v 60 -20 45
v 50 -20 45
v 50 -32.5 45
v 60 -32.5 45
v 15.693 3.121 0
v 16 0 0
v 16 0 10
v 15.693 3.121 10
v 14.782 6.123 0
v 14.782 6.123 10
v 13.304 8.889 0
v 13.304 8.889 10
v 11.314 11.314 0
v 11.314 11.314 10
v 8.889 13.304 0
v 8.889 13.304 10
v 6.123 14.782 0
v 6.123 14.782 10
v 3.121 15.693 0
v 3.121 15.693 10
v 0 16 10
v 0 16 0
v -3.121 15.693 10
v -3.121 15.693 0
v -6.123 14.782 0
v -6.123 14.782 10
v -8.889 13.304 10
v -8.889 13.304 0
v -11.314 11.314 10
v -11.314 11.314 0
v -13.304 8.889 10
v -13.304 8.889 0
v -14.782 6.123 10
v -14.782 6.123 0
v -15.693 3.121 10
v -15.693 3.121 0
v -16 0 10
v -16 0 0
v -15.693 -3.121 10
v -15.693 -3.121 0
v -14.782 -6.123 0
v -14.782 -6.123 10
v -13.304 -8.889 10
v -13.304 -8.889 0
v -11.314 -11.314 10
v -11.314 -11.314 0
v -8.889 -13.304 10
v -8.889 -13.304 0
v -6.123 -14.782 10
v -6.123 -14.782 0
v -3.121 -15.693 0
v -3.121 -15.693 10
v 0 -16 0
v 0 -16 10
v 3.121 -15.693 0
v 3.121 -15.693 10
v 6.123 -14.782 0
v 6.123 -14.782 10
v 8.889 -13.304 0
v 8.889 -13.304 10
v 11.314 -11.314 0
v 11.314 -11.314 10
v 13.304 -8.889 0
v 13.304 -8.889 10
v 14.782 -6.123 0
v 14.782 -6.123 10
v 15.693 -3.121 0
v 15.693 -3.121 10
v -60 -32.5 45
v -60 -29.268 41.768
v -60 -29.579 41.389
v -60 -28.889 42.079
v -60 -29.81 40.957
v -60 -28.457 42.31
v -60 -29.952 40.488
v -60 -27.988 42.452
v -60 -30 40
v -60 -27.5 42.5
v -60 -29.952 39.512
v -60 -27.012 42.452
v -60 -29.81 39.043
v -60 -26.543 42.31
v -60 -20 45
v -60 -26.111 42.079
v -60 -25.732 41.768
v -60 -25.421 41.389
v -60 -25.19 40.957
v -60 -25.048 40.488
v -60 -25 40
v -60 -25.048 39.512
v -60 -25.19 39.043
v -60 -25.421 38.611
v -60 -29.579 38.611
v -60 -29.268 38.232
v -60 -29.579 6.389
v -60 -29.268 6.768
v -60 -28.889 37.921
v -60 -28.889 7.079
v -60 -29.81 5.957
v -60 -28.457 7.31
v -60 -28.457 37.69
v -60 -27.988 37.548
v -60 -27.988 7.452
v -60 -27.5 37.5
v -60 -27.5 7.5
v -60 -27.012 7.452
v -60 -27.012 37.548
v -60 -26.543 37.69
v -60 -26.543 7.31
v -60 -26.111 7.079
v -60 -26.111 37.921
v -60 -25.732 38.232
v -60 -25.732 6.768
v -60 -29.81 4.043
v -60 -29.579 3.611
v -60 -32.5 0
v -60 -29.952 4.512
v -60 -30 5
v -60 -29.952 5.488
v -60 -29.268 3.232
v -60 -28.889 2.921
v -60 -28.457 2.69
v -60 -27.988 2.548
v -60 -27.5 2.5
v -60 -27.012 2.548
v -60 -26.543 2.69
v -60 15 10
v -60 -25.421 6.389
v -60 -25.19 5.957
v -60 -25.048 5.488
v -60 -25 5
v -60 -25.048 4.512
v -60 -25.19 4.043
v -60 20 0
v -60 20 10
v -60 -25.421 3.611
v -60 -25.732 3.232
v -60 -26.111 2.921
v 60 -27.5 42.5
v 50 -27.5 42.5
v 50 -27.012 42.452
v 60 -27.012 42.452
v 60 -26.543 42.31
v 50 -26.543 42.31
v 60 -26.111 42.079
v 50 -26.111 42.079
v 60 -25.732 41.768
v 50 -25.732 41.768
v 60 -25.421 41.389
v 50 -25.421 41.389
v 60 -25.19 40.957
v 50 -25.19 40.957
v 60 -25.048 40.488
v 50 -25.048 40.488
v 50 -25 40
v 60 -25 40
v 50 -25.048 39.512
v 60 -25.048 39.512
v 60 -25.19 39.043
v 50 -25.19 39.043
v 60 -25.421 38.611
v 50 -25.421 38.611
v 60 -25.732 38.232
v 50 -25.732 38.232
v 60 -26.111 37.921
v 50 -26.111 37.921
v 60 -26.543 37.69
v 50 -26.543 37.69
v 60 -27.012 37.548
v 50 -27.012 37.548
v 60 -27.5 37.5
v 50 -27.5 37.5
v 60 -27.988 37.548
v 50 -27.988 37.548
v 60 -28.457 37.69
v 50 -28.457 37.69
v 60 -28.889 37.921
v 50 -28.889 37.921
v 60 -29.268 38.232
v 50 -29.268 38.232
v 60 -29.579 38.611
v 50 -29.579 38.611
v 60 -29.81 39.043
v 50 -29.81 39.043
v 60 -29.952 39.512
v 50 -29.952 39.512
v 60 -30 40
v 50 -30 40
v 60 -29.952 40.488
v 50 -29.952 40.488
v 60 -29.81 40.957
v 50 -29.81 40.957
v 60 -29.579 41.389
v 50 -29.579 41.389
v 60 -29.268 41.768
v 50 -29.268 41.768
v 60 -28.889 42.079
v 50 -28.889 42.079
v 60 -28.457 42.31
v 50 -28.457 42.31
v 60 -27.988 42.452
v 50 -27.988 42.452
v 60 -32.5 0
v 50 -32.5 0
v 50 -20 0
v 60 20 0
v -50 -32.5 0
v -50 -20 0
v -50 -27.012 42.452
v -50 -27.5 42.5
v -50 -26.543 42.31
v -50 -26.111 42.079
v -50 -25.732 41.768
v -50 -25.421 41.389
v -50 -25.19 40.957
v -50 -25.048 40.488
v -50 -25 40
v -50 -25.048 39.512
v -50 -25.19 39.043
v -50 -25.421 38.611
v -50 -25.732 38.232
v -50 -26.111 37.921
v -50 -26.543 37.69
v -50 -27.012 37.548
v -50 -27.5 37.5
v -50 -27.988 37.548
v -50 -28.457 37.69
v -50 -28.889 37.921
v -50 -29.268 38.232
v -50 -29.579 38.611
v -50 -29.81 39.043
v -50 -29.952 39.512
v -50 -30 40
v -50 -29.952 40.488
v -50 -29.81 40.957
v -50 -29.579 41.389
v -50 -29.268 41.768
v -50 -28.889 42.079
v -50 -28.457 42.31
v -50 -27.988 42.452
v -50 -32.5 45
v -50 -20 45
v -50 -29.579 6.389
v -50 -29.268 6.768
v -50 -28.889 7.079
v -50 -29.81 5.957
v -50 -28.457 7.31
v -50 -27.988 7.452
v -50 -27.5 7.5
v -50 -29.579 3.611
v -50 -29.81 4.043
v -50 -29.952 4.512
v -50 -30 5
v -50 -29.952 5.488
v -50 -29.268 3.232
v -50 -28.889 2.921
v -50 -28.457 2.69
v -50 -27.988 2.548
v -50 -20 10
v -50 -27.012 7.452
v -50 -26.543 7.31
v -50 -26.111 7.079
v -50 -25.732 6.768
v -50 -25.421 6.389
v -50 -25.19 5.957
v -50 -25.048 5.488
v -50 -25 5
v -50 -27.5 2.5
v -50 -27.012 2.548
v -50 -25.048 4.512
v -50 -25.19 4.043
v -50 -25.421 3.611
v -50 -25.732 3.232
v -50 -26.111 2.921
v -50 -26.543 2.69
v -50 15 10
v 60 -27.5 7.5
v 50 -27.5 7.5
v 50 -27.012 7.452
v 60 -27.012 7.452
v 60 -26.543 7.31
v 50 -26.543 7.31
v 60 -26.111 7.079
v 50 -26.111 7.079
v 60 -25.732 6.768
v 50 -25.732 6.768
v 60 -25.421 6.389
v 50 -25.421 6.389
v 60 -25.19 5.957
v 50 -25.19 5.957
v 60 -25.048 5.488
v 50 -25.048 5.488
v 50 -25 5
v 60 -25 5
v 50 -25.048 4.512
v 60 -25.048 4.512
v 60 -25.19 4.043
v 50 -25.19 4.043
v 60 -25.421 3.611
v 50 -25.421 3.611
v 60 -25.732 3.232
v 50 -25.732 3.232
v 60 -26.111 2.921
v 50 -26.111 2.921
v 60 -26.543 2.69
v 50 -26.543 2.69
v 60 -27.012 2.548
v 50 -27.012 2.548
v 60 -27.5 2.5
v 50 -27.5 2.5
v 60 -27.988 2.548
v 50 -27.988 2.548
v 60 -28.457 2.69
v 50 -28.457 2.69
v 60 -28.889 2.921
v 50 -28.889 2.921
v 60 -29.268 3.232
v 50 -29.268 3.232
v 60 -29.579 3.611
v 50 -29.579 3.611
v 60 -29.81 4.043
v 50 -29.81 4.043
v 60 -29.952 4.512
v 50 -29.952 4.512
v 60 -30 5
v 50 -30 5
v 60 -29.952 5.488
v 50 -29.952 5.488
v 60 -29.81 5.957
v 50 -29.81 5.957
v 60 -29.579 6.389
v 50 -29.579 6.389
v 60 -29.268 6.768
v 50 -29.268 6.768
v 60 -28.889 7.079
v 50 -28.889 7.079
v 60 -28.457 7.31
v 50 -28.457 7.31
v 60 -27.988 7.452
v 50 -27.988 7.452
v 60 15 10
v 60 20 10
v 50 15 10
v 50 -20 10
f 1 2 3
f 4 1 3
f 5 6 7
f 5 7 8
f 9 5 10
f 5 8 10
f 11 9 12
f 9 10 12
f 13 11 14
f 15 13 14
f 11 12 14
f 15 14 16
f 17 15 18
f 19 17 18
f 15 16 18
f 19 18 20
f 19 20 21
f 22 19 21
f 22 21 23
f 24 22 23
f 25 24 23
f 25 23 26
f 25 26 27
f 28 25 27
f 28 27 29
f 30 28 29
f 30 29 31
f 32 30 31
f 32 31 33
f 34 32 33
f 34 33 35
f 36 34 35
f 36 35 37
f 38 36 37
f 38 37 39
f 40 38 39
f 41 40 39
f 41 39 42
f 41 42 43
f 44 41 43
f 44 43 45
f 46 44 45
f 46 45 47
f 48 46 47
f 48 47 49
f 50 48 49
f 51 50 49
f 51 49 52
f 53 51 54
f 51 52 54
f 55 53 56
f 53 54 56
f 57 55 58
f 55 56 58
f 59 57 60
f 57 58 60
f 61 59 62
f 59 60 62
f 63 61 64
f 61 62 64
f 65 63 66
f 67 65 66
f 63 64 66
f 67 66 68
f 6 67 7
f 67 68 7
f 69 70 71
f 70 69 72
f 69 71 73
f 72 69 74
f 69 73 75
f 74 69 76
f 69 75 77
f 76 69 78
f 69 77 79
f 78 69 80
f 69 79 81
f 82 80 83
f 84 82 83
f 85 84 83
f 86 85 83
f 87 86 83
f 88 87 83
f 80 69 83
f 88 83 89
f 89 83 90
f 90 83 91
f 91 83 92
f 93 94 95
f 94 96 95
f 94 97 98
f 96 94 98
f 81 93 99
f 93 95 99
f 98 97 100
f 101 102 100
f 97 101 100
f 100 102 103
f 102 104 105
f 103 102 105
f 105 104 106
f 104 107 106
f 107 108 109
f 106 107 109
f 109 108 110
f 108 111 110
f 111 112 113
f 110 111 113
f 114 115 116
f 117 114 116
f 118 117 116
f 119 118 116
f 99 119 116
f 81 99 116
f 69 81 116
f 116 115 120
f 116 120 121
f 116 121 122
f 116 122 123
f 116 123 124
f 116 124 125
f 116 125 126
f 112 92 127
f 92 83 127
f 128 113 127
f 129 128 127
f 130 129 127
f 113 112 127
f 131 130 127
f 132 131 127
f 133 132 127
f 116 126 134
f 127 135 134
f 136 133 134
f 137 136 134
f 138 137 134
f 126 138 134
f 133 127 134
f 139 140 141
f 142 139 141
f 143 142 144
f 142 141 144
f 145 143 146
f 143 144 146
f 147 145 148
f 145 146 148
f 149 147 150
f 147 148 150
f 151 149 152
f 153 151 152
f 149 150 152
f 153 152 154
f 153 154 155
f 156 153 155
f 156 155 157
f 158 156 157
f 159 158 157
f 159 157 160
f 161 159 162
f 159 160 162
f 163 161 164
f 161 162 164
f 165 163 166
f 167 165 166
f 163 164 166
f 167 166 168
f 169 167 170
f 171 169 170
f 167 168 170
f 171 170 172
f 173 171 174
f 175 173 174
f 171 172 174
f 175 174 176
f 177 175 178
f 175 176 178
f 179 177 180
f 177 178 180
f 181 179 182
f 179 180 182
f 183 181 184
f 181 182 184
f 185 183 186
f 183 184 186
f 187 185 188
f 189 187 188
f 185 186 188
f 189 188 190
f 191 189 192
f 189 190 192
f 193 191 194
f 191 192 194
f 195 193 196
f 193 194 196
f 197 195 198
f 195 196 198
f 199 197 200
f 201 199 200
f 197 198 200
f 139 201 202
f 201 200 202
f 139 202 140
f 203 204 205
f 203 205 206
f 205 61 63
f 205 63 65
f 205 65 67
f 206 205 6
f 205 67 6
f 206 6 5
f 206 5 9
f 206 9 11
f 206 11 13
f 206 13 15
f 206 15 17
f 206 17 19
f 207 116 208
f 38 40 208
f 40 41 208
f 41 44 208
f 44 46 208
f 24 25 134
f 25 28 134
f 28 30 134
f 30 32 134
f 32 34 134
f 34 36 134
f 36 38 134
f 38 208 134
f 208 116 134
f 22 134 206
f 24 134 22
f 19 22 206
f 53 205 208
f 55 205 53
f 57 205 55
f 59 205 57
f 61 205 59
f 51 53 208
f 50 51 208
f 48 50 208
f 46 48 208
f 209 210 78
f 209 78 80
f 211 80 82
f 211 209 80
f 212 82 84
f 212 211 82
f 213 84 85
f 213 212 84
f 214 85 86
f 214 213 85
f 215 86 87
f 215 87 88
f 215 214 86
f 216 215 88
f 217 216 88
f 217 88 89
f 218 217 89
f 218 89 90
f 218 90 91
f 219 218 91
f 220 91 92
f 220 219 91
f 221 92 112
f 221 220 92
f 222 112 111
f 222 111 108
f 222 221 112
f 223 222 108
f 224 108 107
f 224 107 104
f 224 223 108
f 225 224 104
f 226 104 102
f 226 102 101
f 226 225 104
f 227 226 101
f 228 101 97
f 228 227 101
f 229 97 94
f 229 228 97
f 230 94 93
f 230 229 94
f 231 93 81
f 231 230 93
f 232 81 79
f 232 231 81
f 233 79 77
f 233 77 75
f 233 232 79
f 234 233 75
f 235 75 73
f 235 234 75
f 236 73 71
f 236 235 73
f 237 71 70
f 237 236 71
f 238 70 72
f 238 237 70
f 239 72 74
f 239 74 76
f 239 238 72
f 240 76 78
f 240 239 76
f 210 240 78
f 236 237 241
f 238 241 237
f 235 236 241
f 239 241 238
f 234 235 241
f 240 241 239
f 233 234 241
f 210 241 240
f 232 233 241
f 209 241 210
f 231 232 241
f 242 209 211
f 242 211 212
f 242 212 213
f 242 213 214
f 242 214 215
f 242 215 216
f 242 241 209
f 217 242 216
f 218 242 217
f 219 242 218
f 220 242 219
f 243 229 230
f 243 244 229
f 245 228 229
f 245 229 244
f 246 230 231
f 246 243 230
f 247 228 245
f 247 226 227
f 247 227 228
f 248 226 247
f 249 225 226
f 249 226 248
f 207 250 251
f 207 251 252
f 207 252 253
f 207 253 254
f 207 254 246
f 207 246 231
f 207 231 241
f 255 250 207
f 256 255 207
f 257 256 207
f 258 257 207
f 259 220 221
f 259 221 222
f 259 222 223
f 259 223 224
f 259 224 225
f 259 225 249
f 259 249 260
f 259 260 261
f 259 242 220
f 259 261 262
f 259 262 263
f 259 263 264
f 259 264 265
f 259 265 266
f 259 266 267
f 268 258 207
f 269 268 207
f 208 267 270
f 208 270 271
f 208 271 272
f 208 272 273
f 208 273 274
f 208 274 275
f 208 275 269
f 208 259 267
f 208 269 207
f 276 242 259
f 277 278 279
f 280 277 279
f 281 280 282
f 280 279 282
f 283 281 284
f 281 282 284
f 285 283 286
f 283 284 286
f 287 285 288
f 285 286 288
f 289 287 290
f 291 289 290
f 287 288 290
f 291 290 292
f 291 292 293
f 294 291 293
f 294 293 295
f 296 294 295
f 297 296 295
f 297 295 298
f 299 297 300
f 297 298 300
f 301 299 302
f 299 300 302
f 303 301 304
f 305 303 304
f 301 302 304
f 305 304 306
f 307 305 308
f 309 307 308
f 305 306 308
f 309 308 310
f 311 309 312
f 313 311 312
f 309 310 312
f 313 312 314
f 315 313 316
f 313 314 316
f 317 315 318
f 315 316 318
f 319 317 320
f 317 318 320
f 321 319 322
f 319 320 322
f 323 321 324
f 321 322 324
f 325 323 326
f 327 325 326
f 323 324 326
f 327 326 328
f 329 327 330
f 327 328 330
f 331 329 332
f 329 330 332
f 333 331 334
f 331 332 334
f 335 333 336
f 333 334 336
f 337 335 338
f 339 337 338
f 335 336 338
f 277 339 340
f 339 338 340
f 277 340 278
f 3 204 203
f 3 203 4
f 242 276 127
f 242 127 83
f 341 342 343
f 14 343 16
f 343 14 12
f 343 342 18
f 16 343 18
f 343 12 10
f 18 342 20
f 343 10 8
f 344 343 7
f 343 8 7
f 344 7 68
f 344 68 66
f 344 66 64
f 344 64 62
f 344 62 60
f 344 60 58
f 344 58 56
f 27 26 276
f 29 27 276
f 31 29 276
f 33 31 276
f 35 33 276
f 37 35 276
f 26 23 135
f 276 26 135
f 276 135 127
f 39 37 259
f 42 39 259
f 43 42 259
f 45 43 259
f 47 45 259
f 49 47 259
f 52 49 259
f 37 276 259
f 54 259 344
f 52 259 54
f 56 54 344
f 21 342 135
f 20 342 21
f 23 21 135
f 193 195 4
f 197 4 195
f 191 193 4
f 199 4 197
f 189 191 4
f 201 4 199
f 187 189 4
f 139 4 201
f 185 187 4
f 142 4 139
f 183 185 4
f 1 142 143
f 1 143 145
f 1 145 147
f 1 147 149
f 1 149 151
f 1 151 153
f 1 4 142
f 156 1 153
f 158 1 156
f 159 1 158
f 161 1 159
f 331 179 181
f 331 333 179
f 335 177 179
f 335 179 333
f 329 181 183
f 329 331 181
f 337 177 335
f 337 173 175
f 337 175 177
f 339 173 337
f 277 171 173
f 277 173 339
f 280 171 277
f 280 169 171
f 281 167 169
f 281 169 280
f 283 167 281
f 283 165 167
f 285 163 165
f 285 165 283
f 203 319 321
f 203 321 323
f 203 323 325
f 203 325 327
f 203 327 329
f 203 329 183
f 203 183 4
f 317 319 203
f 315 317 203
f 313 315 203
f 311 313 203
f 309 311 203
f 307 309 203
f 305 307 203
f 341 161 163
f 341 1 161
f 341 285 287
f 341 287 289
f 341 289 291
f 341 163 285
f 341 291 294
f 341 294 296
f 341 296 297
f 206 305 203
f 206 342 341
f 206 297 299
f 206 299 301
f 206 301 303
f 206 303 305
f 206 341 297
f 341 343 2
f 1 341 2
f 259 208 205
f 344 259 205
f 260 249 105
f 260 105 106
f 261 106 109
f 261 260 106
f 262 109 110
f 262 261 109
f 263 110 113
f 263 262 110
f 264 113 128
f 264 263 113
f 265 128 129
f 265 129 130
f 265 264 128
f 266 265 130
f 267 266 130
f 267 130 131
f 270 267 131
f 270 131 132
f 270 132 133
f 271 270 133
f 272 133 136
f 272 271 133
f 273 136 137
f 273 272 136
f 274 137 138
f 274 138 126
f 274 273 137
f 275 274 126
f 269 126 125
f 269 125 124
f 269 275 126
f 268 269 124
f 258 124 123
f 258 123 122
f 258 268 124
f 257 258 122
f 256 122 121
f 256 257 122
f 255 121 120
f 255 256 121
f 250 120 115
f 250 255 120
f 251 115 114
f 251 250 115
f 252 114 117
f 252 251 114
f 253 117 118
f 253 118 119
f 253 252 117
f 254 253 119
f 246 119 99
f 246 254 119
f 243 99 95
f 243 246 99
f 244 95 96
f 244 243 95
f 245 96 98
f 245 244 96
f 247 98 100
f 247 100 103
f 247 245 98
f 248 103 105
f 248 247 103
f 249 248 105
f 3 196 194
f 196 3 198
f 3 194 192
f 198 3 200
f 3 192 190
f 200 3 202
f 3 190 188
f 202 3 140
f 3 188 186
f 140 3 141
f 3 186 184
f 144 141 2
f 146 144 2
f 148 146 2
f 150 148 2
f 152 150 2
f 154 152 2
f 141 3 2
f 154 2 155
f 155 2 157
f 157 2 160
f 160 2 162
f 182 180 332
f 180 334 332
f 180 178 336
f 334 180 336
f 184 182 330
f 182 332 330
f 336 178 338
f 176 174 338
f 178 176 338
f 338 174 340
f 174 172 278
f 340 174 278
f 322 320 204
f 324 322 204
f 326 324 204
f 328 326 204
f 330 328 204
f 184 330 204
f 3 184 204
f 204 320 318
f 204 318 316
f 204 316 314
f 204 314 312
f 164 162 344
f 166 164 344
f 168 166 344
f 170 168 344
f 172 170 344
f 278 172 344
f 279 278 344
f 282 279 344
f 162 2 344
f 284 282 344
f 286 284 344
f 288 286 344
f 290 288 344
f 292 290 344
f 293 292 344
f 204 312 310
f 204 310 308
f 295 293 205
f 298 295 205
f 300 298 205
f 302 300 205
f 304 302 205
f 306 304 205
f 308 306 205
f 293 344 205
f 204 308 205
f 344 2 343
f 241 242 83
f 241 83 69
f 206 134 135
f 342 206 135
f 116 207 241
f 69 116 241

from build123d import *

# Parameters (mm, degrees)
SKETCH2_W           = 100
SKETCH2_H           = 40
BOSS_EXTRUDE1_DEPTH = 10
SKETCH3_R           = 7.5
CUT_EXTRUDE1_DEPTH  = 55.772255751
SKETCH4_R           = 16
CUT_EXTRUDE2_DEPTH  = 55.772255751
SKETCH5_R           = 2.5
BOSS_EXTRUDE2_DEPTH = 10


with BuildPart() as part:
    # Sketch2 → Boss-Extrude1 (new body)
    with BuildSketch(Plane.XY):
        Rectangle(SKETCH2_W, SKETCH2_H)
    extrude(amount=BOSS_EXTRUDE1_DEPTH)

    # Sketch3 → Cut-Extrude1 (cut, through all)
    with BuildSketch(Plane.XY.offset(10)):
        Circle(SKETCH3_R)
    extrude(amount=-CUT_EXTRUDE1_DEPTH, mode=Mode.SUBTRACT)

    # Sketch4 → Cut-Extrude2 (cut, through all)
    with BuildSketch(Plane.XY.offset(10)):
        Circle(SKETCH4_R)
    extrude(amount=-CUT_EXTRUDE2_DEPTH, mode=Mode.SUBTRACT)

    # Sketch5 → Boss-Extrude2 (add)
    with BuildSketch(Plane.ZY.offset(50)):
        Polygon((0, 20), (10, 20), (10, 15), (45, -20), (45, -32.5), (10, -32.5), (0, -32.5), align=None)
        with Locations((5, -27.5)):
            Circle(SKETCH5_R, mode=Mode.SUBTRACT)
        with Locations((40, -27.5)):
            Circle(SKETCH5_R, mode=Mode.SUBTRACT)
    boss_extrude2 = extrude(amount=BOSS_EXTRUDE2_DEPTH)

    # Mirror1: Boss-Extrude2 across plane
    add(boss_extrude2.mirror(Plane(origin=(0, 0, 0), x_dir=(0, 0, 1), z_dir=(1, 0, 0))))


solid = part.part
